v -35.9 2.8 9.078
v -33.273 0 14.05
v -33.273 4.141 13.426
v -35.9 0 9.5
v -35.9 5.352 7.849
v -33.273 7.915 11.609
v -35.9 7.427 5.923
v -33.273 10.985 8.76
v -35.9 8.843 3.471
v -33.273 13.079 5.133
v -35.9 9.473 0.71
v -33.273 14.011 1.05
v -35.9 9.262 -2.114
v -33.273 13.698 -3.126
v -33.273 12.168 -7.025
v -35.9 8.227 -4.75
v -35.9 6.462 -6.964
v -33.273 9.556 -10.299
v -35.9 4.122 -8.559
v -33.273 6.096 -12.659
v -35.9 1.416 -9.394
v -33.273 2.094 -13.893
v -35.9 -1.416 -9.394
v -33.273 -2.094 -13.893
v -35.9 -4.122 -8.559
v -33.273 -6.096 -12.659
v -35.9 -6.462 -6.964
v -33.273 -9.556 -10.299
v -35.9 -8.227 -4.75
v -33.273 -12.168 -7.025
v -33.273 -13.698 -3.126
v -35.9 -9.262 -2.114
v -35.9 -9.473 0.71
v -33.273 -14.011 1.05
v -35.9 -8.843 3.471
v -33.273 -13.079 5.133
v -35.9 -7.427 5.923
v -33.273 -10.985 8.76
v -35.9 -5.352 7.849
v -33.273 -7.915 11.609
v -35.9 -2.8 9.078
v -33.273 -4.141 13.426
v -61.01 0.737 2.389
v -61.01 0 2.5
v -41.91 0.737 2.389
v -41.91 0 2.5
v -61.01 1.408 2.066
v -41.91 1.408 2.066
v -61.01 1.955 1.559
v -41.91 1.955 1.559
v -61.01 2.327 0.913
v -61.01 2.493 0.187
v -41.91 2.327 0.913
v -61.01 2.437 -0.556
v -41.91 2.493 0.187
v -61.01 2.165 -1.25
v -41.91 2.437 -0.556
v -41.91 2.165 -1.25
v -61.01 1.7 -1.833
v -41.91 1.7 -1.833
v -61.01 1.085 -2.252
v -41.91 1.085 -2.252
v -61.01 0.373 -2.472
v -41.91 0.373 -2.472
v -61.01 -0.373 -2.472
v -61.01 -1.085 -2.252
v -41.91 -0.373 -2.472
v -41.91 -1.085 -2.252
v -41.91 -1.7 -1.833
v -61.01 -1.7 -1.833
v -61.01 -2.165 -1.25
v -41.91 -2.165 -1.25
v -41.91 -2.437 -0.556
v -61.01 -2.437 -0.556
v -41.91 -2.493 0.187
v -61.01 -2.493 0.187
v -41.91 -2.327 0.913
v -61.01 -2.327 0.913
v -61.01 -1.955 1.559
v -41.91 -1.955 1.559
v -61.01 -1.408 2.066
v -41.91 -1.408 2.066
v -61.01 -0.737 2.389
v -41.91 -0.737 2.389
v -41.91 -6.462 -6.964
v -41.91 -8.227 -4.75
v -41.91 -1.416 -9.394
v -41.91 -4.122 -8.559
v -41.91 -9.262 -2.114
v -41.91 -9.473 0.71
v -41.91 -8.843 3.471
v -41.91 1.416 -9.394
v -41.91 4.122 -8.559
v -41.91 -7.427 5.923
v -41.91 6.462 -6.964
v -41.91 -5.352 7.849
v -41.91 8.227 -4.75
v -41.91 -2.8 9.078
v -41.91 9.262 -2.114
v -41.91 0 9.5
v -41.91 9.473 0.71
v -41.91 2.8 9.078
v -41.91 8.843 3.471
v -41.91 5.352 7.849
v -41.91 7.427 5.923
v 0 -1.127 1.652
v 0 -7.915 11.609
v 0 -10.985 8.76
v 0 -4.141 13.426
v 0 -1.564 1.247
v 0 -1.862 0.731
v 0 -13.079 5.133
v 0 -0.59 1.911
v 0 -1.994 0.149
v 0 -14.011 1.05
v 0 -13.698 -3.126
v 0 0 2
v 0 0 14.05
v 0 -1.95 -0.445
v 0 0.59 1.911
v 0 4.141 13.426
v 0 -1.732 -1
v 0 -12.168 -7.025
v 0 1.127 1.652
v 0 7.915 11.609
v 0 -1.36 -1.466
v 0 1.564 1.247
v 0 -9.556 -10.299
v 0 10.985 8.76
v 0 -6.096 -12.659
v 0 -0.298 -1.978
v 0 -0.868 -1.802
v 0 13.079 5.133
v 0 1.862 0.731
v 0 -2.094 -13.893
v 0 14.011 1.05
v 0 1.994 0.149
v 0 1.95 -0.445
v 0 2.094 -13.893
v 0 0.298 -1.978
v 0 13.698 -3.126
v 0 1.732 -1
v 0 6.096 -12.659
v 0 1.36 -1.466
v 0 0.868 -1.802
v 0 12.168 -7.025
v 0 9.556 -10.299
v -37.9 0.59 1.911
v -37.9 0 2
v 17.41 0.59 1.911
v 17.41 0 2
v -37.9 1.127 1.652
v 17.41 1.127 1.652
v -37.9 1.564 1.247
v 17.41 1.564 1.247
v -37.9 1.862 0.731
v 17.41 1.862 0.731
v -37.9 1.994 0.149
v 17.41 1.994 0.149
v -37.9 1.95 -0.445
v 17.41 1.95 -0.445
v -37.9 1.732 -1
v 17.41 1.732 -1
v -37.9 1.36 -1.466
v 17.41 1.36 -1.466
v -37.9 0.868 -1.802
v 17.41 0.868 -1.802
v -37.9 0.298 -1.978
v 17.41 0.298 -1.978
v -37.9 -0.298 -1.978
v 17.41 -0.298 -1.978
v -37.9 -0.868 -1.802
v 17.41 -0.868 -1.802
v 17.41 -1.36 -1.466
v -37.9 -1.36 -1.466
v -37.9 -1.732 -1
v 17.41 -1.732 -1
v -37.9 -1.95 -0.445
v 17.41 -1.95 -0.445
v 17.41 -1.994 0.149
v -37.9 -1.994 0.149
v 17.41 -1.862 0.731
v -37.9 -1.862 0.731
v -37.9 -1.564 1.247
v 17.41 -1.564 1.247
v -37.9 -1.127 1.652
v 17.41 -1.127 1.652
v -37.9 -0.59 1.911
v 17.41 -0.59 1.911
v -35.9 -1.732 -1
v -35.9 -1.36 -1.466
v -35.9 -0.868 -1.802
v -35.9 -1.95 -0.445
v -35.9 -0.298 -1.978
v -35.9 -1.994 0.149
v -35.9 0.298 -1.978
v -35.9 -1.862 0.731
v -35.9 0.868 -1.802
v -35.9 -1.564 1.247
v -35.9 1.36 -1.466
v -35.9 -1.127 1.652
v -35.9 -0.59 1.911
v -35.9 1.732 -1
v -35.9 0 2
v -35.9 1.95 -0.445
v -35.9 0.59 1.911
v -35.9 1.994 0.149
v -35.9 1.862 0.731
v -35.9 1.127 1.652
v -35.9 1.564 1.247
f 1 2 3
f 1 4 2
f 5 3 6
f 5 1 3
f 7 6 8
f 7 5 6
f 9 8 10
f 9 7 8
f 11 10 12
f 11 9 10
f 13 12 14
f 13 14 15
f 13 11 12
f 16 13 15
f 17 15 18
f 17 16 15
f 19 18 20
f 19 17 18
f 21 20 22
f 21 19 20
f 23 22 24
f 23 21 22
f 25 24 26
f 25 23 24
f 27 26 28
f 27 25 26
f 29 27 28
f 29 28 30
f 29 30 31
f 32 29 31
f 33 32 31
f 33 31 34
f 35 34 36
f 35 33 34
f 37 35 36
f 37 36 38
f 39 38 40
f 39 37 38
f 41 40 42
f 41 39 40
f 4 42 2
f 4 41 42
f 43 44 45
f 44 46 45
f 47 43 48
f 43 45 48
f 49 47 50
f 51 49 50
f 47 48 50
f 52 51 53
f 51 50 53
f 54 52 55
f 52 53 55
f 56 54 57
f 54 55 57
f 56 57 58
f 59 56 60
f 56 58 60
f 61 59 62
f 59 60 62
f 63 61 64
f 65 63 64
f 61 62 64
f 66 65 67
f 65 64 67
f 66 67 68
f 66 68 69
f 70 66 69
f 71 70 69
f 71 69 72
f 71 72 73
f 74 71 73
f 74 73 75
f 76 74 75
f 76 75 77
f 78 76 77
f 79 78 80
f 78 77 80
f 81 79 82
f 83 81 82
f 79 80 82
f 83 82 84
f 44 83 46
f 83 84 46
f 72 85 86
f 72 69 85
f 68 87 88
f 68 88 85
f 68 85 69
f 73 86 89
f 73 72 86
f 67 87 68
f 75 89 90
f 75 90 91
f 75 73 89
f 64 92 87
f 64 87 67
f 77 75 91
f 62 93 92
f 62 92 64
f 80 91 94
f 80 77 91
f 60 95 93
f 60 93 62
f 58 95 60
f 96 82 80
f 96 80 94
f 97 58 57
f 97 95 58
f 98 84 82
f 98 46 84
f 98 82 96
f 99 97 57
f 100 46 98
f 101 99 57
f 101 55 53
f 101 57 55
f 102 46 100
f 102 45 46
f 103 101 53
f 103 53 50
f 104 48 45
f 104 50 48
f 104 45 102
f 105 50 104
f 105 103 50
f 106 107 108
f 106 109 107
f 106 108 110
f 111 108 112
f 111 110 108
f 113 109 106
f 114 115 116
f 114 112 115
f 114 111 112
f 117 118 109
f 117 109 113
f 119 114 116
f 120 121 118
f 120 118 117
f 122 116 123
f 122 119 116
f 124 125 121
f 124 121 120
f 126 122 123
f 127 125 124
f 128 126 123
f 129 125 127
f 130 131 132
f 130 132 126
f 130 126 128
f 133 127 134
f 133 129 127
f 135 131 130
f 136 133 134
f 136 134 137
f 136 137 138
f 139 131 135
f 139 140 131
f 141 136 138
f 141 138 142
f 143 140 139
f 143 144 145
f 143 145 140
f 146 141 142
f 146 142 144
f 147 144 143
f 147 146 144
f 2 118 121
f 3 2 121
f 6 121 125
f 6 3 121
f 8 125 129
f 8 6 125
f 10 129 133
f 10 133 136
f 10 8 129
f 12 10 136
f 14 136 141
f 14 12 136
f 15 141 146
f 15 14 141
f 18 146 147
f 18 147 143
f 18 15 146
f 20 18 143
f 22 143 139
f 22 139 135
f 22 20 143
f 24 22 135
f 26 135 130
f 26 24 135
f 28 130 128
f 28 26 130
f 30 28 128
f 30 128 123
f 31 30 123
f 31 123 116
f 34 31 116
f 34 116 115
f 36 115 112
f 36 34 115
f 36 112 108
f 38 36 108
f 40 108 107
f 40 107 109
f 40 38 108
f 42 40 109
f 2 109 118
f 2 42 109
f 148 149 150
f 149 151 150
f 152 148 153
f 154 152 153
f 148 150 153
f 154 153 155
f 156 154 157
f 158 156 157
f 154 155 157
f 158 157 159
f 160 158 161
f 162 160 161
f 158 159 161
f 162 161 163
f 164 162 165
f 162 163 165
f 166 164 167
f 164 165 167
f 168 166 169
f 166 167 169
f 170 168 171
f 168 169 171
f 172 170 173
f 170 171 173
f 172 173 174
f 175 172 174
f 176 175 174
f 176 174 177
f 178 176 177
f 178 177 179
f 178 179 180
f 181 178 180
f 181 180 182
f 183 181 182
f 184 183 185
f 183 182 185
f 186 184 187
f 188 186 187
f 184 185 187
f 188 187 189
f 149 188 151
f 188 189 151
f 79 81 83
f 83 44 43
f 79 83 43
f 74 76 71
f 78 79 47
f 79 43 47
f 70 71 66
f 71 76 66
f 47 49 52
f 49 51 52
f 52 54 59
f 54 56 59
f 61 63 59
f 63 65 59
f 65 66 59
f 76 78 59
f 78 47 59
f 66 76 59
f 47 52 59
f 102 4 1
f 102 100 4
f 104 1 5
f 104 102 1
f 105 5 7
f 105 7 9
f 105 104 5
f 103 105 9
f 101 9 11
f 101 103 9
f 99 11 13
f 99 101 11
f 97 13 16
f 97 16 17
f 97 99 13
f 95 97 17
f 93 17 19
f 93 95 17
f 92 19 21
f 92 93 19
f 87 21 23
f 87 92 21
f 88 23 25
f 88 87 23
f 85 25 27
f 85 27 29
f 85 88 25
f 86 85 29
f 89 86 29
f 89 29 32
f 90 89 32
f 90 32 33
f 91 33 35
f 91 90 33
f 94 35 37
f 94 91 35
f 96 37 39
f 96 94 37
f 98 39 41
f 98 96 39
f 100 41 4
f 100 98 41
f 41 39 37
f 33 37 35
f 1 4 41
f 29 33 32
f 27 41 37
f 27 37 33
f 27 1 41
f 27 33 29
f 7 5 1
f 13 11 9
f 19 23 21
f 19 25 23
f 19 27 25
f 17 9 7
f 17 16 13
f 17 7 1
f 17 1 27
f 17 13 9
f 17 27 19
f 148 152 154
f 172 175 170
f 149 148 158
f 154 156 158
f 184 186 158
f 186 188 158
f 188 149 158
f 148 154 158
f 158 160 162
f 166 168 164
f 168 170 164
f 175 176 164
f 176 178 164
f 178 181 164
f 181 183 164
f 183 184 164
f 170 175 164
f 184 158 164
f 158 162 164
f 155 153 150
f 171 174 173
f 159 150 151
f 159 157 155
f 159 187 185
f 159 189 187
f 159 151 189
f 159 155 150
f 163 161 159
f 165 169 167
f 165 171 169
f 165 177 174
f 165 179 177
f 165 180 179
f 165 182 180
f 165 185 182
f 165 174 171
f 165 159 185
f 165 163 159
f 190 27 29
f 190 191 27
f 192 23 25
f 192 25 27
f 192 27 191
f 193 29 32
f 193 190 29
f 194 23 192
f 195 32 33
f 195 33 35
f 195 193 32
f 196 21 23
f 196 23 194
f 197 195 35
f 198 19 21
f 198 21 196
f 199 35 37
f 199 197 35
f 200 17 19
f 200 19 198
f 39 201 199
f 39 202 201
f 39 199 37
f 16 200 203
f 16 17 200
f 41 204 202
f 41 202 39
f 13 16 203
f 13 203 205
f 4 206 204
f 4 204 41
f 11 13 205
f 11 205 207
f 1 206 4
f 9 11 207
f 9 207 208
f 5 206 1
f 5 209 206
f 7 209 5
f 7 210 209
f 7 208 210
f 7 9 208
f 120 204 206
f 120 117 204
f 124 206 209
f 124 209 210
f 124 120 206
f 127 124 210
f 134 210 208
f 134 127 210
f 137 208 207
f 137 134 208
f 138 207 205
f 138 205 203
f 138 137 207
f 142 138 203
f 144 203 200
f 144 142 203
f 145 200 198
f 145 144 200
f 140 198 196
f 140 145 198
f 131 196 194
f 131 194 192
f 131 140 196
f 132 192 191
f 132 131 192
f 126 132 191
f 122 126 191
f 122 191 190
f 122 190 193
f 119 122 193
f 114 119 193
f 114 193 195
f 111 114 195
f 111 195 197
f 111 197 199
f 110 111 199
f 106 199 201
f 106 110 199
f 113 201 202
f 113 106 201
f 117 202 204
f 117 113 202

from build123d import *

# Parameters (mm, degrees)
F1_W = 17.41
F1_H = 2
F2_W = 55.31
F2_H = 2
F3_W = 19.1
F3_H = 2.5


with BuildPart() as f4:
    # F1 (on Front) → F4 (revolve)
    with BuildSketch(Plane.XZ):
        with Locations((8.705, 1)):
            Rectangle(F1_W, F1_H)
    revolve(axis=Axis((-21.8, 0, 0), (-1, 0, 0)))

    # F2 (on Front) → F5 (revolve)
    with BuildSketch(Plane.XZ):
        with Locations((-10.245, 1)):
            Rectangle(F2_W, F2_H)
    revolve(axis=Axis((-21.8, 0, 0), (-1, 0, 0)))


with BuildPart() as f4b:
    # F1 (on Front) → F4, piece 2 (revolve)
    with BuildSketch(Plane.XZ):
        Polygon((0, 14.05), (-33.2730562752, 14.05), (-35.9, 9.5), (-35.9, 2), (0, 2), align=None)
    revolve(axis=Axis((-21.8, 0, 0), (-1, 0, 0)))


with BuildPart() as f6:
    # F3 (on Front) → F6 (revolve)
    with BuildSketch(Plane.XZ):
        with Locations((-51.46, 1.25)):
            Rectangle(F3_W, F3_H)
        Polygon((-35.9, 9.5), (-41.91, 9.5), (-41.91, 2.5), (-41.91, 0), (-35.9, 0), align=None)
    revolve(axis=Axis((-21.8, 0, 0), (-1, 0, 0)))


solid = Compound([f4.part, f4b.part, f6.part])
